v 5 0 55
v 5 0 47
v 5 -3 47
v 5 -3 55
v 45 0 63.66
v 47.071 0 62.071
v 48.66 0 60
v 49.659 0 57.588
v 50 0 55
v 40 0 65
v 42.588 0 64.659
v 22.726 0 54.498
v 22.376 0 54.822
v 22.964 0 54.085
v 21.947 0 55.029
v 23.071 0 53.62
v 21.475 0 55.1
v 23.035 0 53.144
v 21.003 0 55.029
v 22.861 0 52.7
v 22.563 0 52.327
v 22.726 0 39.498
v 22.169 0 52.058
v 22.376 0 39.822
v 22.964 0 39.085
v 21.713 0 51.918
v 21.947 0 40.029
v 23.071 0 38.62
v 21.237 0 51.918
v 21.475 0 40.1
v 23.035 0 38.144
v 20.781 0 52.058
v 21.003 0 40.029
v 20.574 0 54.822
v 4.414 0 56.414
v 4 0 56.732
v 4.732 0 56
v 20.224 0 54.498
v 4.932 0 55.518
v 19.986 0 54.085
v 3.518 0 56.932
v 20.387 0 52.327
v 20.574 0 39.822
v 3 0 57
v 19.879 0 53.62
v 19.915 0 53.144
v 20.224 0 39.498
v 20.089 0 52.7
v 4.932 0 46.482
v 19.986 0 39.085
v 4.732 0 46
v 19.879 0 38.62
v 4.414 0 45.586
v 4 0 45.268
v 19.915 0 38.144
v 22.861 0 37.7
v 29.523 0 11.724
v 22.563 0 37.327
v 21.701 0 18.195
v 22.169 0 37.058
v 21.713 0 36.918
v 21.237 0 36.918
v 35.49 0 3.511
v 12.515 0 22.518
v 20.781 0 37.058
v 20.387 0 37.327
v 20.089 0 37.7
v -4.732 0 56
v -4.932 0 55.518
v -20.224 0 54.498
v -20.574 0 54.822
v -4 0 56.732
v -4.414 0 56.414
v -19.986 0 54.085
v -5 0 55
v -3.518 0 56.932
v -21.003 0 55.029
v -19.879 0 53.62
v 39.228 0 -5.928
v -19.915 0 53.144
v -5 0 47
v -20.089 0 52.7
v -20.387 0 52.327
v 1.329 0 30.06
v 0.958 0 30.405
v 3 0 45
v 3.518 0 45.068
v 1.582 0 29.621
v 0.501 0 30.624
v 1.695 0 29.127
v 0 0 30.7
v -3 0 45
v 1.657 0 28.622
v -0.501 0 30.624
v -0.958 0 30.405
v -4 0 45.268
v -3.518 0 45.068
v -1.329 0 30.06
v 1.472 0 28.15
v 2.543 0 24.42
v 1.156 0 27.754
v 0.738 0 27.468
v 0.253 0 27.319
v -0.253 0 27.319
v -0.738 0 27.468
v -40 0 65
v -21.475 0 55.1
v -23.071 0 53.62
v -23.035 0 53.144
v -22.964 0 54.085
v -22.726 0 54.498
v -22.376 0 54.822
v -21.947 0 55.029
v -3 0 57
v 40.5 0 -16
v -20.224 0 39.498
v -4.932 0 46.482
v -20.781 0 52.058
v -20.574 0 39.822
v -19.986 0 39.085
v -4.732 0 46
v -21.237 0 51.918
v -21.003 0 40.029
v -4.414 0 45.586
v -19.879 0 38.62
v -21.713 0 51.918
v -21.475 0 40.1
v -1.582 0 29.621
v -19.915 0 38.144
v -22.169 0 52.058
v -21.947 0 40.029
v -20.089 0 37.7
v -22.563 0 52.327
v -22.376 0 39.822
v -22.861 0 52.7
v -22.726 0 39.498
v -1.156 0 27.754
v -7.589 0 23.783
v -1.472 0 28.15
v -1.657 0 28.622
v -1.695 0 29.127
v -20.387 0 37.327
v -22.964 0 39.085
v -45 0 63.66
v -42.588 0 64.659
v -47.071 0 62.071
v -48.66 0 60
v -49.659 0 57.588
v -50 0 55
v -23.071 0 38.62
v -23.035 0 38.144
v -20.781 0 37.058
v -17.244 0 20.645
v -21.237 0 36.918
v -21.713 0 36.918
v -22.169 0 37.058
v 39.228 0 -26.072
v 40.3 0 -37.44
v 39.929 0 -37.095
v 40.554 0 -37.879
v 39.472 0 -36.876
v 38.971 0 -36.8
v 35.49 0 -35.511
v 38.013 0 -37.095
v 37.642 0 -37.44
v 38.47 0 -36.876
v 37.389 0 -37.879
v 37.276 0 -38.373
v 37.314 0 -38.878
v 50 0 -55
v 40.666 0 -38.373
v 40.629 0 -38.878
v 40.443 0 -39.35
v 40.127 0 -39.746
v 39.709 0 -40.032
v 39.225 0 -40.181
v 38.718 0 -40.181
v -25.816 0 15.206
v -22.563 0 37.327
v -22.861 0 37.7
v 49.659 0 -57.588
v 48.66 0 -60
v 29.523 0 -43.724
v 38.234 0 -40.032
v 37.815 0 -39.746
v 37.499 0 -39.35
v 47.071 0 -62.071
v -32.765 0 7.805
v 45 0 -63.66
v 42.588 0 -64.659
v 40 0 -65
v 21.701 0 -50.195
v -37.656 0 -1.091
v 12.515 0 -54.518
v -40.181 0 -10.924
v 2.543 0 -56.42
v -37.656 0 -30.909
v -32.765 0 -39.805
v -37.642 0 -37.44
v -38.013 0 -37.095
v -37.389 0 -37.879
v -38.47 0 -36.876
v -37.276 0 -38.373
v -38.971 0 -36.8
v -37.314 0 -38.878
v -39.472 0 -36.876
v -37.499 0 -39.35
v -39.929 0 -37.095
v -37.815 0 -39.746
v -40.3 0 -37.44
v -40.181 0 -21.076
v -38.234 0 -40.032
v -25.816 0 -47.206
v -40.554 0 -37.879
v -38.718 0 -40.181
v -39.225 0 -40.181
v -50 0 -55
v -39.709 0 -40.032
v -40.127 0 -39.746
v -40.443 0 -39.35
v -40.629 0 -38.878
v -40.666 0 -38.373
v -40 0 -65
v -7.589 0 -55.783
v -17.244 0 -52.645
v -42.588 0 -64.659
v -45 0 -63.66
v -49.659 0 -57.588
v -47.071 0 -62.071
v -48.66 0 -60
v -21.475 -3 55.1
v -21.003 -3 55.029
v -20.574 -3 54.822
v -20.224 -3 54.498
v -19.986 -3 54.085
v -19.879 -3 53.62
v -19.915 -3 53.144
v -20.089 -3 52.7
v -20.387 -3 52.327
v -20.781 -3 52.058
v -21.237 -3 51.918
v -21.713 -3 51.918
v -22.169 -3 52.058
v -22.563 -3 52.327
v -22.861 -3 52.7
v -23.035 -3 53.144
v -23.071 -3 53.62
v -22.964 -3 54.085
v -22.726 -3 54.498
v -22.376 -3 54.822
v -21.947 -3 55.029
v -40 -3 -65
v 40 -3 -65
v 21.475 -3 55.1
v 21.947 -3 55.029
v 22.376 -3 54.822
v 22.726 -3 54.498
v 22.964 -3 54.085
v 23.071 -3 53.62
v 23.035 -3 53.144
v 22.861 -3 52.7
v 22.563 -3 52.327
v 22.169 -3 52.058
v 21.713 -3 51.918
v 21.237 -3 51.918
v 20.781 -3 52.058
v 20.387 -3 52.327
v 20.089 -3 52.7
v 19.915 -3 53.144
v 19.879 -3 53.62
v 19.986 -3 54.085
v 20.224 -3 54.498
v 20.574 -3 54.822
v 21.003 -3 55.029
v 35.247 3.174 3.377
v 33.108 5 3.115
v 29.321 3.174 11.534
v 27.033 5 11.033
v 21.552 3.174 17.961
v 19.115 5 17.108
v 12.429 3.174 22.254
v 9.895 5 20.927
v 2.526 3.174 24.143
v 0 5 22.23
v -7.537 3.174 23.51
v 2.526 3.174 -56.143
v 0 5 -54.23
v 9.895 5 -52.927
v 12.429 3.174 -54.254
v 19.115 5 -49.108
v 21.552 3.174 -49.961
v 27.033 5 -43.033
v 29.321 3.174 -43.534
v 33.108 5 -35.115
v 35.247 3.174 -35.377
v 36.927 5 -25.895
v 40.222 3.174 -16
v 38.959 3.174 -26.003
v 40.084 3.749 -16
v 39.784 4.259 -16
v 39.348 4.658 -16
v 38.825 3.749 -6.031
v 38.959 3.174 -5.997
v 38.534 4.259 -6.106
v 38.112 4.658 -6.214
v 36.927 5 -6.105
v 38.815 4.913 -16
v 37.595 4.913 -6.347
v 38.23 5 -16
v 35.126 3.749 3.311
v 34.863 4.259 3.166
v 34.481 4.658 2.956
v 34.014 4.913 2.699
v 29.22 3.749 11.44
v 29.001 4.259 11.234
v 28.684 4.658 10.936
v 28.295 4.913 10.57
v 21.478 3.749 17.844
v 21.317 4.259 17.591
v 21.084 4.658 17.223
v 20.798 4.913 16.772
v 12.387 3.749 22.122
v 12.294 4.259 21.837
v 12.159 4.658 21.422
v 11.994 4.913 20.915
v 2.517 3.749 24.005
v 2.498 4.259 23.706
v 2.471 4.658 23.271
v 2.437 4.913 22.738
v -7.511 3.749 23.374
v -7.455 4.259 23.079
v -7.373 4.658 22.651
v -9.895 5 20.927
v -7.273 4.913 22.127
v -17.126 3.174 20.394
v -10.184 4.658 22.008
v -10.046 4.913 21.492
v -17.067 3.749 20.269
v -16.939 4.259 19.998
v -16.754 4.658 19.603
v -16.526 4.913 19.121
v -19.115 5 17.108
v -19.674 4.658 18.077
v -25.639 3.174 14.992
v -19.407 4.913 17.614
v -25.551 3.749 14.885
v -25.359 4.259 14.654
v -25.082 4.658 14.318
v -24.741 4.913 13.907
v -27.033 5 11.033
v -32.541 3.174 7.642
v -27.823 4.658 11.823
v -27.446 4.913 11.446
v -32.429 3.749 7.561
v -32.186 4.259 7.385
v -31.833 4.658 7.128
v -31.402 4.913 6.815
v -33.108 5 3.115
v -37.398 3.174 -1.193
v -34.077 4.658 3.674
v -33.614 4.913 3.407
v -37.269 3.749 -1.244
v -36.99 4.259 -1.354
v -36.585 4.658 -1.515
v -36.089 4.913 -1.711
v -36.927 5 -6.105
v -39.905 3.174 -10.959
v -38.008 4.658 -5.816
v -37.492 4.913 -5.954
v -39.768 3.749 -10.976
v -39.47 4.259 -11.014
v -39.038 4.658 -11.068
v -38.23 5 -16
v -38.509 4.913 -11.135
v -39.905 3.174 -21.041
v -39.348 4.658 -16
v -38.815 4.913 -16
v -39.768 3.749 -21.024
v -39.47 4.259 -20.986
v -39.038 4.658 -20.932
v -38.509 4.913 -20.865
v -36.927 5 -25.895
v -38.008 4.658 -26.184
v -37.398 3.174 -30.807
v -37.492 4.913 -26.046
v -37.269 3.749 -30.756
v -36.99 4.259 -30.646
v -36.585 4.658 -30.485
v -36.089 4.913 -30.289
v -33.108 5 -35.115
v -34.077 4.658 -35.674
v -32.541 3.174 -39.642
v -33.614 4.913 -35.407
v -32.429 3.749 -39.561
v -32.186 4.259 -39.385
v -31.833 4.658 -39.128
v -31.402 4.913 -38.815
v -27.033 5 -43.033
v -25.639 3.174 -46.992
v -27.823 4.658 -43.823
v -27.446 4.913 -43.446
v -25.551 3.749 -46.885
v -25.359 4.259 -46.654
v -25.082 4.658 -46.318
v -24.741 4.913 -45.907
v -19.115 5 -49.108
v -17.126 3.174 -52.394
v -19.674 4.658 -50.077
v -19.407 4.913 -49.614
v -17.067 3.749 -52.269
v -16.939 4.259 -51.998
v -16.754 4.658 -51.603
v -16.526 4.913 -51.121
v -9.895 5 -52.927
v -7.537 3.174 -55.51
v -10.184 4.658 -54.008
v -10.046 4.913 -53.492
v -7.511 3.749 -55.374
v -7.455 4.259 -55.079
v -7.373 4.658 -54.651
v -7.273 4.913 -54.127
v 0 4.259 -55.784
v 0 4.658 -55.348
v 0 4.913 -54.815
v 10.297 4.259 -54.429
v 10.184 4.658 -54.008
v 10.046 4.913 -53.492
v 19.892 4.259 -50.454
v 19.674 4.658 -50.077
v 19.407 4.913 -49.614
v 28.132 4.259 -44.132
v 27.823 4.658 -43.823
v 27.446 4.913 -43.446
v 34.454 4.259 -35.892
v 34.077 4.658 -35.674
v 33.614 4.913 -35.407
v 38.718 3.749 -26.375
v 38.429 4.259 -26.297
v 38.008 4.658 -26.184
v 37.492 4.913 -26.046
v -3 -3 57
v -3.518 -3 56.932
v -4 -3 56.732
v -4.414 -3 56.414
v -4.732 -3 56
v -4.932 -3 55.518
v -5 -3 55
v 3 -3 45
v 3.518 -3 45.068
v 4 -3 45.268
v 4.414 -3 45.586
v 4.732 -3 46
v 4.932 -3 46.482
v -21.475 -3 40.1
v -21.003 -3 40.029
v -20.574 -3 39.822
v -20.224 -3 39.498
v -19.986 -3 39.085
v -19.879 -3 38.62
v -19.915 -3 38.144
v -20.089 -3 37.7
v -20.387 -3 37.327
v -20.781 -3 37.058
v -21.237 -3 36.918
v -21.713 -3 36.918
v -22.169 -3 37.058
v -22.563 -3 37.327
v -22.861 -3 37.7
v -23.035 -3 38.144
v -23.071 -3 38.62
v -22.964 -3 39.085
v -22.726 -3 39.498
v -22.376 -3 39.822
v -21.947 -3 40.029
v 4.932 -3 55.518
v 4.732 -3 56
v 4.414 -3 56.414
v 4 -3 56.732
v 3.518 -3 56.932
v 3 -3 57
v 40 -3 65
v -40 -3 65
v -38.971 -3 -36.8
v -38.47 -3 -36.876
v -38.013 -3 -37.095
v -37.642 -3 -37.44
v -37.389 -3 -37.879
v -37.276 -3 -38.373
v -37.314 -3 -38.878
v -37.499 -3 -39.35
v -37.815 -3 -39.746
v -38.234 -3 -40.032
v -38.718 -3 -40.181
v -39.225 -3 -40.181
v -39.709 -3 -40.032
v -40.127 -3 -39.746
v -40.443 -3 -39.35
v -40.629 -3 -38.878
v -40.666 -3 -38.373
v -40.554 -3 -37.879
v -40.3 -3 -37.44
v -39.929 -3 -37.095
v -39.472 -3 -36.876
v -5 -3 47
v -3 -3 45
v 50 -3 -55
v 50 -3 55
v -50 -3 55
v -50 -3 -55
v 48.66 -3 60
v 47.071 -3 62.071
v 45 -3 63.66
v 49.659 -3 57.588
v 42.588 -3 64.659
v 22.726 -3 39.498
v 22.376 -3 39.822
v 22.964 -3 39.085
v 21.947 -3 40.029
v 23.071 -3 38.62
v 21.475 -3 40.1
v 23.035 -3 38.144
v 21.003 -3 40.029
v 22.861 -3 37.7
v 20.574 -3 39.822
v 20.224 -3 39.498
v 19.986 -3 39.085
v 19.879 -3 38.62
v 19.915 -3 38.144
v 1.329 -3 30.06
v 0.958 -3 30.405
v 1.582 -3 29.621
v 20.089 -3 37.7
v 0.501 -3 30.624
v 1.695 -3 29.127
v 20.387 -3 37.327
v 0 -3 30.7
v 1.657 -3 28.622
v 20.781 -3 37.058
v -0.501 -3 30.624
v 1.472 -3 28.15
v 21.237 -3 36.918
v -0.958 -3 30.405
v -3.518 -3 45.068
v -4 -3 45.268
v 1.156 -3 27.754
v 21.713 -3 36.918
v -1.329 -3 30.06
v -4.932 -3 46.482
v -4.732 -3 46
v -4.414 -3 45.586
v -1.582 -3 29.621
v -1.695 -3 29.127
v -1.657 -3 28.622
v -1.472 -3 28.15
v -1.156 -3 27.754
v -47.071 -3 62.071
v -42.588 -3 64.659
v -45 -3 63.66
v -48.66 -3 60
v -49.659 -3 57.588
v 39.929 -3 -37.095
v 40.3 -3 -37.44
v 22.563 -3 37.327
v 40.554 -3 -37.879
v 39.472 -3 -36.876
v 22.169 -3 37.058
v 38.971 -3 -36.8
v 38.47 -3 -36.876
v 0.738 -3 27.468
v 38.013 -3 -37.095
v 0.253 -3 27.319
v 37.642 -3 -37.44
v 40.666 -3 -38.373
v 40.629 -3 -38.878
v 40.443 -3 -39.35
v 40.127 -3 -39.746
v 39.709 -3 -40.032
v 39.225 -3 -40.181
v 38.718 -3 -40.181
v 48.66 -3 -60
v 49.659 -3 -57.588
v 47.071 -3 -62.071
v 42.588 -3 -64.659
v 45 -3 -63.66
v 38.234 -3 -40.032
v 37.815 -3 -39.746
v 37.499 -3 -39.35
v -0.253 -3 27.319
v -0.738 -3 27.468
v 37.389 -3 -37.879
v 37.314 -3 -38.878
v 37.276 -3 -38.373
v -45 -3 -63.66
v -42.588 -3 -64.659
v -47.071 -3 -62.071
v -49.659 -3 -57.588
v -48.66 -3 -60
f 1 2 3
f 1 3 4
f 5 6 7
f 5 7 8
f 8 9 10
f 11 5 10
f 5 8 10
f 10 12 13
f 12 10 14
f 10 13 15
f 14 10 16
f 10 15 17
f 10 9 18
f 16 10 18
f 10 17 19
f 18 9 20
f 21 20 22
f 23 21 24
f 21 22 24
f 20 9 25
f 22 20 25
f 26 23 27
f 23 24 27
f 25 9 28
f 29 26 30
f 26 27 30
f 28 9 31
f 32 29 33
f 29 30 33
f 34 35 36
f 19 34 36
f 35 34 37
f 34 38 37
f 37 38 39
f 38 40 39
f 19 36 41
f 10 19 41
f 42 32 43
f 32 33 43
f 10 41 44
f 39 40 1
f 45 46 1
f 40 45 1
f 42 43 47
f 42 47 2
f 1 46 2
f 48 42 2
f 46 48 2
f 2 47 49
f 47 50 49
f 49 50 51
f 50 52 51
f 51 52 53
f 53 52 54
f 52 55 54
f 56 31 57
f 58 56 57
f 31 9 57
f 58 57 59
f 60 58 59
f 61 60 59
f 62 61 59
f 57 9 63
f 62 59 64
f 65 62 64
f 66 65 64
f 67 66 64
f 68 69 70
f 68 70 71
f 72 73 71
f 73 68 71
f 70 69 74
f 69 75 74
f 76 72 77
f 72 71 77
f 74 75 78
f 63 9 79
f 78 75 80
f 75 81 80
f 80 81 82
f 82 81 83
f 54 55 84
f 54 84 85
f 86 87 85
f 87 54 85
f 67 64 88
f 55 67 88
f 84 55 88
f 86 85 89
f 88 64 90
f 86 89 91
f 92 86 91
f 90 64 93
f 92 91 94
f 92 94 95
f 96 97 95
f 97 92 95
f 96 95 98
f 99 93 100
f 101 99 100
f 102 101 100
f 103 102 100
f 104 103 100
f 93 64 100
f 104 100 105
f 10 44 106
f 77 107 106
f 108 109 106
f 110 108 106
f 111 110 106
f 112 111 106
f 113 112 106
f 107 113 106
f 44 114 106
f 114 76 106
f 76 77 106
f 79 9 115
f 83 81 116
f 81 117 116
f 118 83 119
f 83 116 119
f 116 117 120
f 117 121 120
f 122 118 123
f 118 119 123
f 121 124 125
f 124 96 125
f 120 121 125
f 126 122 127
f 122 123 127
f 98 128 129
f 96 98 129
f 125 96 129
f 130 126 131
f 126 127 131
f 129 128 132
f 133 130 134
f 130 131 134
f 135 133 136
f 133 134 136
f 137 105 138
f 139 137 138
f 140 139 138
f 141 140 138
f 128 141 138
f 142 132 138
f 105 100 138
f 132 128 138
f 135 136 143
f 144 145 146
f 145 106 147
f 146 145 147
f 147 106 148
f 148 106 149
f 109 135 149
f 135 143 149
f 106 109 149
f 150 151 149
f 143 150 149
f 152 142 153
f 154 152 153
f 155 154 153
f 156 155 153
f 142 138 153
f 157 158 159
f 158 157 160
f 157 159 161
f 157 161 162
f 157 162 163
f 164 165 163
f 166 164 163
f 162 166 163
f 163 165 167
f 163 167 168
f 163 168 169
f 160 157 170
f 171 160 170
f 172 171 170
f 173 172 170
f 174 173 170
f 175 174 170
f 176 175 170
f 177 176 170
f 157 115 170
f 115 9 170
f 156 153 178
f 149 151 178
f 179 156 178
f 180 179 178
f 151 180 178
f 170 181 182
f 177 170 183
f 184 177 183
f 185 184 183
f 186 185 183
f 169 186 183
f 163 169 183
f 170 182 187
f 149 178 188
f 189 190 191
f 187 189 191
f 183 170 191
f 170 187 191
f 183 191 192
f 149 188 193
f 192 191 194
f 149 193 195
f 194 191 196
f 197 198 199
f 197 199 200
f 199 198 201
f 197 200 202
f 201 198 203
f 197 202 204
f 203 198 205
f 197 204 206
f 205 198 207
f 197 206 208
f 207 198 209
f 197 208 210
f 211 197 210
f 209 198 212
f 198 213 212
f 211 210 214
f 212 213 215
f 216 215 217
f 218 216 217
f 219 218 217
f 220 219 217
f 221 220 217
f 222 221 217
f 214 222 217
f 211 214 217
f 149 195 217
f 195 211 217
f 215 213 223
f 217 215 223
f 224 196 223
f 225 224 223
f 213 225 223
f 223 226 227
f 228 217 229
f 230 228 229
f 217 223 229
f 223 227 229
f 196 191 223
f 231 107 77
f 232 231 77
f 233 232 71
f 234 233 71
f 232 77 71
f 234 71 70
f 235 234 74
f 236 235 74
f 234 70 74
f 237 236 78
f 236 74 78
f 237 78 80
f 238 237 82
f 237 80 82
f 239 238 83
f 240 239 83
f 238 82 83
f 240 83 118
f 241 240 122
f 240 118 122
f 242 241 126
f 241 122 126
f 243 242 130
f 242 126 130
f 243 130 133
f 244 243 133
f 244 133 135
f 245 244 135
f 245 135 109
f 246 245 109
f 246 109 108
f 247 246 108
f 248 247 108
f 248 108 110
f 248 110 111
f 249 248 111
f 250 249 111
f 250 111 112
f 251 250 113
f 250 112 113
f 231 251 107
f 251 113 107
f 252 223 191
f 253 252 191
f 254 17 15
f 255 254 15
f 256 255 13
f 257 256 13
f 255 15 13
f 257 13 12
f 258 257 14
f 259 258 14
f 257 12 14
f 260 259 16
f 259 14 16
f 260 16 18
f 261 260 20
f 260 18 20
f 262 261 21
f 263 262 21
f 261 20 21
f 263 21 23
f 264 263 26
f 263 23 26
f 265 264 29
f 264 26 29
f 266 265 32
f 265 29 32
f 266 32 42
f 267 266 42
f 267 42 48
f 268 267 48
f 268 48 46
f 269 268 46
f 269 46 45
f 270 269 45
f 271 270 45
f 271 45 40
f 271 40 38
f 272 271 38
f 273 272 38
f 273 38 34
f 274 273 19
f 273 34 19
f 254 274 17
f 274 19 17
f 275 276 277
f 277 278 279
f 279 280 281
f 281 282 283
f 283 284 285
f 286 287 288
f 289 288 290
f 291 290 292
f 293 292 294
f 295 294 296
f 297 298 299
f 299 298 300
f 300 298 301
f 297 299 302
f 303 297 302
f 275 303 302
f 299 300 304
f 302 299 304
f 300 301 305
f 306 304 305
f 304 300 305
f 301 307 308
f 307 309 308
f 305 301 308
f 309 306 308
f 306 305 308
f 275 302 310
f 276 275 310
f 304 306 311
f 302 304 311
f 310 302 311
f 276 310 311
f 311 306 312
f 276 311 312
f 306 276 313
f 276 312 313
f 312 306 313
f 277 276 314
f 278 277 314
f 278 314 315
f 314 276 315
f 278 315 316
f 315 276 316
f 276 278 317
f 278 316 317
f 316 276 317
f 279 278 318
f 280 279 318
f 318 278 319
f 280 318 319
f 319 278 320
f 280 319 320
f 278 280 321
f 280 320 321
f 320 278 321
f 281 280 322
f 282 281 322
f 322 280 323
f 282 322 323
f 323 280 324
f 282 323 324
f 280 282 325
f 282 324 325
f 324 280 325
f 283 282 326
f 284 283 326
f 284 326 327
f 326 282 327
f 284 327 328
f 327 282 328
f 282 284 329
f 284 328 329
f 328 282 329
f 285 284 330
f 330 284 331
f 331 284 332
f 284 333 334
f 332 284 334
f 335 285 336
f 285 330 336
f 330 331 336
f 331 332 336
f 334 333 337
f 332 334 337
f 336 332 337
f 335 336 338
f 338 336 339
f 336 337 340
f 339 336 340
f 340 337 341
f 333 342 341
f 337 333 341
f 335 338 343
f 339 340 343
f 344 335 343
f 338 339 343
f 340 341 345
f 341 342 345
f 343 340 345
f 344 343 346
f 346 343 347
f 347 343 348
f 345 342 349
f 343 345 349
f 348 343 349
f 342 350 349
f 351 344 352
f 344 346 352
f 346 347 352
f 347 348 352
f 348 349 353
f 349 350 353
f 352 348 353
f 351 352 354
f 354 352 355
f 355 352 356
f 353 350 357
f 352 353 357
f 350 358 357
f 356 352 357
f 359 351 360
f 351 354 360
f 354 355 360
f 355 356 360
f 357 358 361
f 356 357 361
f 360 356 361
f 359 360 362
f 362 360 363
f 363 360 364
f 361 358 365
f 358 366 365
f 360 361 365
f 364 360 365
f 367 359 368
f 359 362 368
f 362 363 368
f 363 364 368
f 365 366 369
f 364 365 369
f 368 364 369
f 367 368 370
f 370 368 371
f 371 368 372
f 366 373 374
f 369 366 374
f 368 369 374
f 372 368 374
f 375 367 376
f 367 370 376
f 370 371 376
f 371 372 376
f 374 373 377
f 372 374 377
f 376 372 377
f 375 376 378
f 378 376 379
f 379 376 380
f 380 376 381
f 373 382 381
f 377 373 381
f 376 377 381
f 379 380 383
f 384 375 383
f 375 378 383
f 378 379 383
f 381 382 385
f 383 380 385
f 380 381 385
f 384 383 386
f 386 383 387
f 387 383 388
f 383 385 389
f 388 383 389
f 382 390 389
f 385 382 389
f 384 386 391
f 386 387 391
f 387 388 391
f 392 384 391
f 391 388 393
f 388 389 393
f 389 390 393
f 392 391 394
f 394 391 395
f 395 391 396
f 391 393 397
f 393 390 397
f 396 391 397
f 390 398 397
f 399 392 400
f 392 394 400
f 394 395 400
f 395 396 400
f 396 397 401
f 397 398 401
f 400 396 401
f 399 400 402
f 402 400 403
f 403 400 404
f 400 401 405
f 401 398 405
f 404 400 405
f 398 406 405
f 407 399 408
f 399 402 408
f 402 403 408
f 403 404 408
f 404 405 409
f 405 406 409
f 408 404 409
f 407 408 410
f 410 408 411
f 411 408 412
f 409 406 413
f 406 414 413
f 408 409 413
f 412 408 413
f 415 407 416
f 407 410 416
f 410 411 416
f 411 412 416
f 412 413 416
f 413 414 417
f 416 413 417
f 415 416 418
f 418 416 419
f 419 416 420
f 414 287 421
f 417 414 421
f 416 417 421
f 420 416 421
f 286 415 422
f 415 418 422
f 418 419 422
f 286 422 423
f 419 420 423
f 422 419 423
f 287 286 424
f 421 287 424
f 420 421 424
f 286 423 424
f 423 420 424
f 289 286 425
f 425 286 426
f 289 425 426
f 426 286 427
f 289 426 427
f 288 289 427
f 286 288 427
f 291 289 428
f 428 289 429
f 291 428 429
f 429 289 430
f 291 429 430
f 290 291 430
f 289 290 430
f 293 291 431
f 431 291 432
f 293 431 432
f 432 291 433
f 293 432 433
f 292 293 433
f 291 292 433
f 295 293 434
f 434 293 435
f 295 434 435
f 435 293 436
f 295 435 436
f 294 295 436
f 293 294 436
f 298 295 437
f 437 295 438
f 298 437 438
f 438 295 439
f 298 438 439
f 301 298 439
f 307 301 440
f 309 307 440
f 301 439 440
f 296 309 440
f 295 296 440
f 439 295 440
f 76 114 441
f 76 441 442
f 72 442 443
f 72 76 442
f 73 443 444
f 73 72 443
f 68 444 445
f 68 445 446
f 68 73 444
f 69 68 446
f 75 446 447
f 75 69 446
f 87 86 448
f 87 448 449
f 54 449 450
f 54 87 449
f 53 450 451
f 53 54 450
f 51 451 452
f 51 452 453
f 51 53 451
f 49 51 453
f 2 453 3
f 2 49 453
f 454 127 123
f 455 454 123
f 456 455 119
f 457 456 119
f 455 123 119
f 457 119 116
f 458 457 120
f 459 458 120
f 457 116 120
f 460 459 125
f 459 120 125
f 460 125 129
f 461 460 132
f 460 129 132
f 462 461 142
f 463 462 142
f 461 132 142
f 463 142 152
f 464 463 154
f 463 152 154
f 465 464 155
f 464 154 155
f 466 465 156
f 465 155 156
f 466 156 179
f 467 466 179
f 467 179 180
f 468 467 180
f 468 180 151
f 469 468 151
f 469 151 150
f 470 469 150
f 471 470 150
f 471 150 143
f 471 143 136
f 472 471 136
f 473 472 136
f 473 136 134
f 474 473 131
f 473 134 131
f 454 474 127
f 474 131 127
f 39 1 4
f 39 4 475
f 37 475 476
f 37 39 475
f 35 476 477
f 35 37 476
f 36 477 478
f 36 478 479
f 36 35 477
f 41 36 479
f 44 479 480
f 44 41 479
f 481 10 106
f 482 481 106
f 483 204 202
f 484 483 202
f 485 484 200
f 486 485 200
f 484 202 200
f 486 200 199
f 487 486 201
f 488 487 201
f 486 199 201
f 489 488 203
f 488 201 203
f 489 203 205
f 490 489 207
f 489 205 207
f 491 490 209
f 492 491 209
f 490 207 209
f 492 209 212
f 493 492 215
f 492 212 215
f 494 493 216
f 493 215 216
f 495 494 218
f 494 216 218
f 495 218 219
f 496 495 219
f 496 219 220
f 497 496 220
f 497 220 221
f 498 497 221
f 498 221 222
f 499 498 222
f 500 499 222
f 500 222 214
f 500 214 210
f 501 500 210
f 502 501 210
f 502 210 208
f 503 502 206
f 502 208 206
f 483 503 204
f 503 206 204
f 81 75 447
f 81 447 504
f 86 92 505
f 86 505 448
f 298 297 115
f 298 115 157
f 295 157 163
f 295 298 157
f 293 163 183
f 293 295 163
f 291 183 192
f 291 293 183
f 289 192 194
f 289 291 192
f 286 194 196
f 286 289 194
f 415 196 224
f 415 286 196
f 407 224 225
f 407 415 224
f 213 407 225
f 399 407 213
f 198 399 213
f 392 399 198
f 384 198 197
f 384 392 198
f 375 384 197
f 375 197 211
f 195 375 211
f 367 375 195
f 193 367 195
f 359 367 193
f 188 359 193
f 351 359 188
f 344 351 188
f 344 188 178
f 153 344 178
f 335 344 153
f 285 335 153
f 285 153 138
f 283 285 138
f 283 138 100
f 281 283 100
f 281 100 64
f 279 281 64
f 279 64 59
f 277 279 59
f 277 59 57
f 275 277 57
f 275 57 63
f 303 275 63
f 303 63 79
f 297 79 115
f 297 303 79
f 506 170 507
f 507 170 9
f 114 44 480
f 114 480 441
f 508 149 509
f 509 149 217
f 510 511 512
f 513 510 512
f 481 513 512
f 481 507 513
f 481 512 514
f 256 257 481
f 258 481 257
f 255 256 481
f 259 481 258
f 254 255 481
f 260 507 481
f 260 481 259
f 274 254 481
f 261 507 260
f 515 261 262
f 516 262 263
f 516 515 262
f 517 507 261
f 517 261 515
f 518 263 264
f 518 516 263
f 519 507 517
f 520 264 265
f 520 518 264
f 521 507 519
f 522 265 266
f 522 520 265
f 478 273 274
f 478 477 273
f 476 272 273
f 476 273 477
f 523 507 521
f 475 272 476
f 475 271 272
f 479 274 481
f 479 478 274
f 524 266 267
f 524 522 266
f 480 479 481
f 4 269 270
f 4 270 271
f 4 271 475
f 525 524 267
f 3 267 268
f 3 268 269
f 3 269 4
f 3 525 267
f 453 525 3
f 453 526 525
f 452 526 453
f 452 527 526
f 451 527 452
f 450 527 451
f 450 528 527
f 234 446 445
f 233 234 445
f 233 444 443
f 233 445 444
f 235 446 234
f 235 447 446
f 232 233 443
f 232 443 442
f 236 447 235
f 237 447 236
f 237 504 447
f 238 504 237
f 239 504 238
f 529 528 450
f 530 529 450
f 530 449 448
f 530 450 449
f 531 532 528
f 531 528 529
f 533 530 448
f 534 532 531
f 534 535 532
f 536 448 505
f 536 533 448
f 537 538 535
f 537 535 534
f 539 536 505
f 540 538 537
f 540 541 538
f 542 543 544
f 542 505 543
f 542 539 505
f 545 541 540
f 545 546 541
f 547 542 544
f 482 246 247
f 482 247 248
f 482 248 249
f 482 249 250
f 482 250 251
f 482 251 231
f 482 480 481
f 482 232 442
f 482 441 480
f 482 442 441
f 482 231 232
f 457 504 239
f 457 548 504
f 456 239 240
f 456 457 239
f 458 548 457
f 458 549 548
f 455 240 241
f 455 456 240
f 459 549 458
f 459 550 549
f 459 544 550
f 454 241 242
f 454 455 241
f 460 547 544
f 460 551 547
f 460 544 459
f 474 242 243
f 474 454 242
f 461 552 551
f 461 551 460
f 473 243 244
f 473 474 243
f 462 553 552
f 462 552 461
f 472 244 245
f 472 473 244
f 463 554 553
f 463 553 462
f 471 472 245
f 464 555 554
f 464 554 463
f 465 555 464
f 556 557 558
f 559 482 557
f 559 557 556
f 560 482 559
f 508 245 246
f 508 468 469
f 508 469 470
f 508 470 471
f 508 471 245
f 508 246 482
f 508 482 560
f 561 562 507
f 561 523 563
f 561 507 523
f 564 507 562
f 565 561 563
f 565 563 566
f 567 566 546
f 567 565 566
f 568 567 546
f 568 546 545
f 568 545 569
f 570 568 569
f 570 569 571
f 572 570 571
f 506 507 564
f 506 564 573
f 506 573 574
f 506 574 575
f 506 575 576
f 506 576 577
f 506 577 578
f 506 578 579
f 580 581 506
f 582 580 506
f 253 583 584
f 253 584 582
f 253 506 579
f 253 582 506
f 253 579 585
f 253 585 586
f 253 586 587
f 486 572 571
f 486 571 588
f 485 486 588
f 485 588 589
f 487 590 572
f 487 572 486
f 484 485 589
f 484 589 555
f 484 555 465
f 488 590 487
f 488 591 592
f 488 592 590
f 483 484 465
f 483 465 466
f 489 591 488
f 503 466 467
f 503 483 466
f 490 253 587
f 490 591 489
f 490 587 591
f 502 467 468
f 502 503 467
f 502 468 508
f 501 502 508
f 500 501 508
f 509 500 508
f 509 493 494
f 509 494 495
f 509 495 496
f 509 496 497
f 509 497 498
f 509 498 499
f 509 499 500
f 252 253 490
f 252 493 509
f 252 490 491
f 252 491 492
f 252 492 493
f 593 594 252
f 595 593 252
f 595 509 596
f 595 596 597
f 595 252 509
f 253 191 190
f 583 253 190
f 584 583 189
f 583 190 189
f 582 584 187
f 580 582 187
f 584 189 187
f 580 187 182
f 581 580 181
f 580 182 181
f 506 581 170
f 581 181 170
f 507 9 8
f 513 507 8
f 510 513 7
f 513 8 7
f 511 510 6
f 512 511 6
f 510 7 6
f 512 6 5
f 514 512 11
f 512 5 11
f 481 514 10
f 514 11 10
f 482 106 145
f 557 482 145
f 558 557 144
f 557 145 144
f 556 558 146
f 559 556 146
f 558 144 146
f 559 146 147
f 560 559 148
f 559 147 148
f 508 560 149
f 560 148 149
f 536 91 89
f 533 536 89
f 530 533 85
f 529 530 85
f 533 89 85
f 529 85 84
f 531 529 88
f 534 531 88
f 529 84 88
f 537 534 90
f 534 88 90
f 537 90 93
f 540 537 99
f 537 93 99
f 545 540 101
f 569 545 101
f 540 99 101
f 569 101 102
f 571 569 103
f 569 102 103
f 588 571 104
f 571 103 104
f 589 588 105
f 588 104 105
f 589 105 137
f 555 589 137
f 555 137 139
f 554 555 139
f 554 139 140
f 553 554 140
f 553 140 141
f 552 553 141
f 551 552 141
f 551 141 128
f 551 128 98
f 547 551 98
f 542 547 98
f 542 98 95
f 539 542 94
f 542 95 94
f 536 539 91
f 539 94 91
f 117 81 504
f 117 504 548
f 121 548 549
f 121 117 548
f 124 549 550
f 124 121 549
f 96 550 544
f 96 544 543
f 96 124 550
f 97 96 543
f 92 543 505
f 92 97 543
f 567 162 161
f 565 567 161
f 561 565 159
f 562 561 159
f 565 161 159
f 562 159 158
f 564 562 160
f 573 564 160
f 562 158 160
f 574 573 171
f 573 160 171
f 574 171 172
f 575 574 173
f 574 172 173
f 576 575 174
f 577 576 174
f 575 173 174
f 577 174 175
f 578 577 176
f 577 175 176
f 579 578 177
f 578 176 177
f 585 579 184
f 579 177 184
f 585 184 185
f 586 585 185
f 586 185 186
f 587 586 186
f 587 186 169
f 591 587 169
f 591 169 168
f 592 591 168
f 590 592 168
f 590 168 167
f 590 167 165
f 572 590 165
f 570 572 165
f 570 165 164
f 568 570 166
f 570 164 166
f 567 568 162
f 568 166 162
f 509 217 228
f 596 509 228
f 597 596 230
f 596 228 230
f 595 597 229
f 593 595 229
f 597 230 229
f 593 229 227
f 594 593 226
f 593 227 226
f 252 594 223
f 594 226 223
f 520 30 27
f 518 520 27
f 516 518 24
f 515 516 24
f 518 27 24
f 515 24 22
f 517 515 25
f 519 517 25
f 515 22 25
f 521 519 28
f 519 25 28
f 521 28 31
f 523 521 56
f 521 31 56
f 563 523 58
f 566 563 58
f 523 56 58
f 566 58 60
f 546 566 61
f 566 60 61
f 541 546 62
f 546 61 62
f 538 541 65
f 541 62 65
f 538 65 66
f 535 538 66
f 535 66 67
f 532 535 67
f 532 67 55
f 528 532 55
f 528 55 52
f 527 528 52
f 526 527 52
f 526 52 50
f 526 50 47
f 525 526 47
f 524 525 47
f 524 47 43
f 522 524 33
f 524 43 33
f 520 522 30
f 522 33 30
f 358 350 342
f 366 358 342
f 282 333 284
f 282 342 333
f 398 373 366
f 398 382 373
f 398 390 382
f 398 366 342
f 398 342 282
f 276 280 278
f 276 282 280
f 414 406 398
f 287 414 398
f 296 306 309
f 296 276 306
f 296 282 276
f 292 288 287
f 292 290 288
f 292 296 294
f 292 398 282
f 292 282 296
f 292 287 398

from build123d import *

# Parameters (mm, degrees)
SKETCH1_R           = 1.6
SKETCH1_R_2         = 1.7
BOSS_EXTRUDE1_DEPTH = 3
SKETCH2_R           = 40.5
BOSS_EXTRUDE2_DEPTH = 5
BOSS_EXTRUDE2_TAPER = 5
FILLET1_R           = 2


with BuildPart() as part:
    # Sketch1 → Boss-Extrude1 (new body)
    with BuildSketch(Plane(origin=(0, 0, 0), x_dir=(1, 0, 0), z_dir=(0, 1, 0))):
        with BuildLine():
            Line((40, -65), (-40, -65))
            ThreePointArc((-40, -65), (-47.071067812, -62.071067812), (-50, -55))
            Line((-50, -55), (-50, 55))
            ThreePointArc((-50, 55), (-47.071067812, 62.071067812), (-40, 65))
            Line((-40, 65), (40, 65))
            ThreePointArc((40, 65), (47.071067812, 62.071067812), (50, 55))
            Line((50, 55), (50, -55))
            ThreePointArc((50, -55), (47.071067812, -62.071067812), (40, -65))
        make_face()
        with Locations(Location((21.475, -38.5, 0), (0, 0, 270))):
            Circle(SKETCH1_R, mode=Mode.SUBTRACT)
        with Locations(Location((21.475, -53.5, 0), (0, 0, 270))):
            Circle(SKETCH1_R, mode=Mode.SUBTRACT)
        with Locations(Location((-21.475, -38.5, 0), (0, 0, 270))):
            Circle(SKETCH1_R, mode=Mode.SUBTRACT)
        with Locations(Location((-21.475, -53.5, 0), (0, 0, 270))):
            Circle(SKETCH1_R, mode=Mode.SUBTRACT)
        with Locations(Location((0, -29, 0), (0, 0, 270))):
            Circle(SKETCH1_R_2, mode=Mode.SUBTRACT)
        with Locations(Location((-38.97114317, 38.5, 0), (0, 0, 270))):
            Circle(SKETCH1_R_2, mode=Mode.SUBTRACT)
        with Locations(Location((38.97114317, 38.5, 0), (0, 0, 270))):
            Circle(SKETCH1_R_2, mode=Mode.SUBTRACT)
        with BuildLine():
            Line((3, -57), (-3, -57))
            ThreePointArc((-3, -57), (-4.414213562, -56.414213562), (-5, -55))
            Line((-5, -55), (-5, -47))
            ThreePointArc((-5, -47), (-4.414213562, -45.585786438), (-3, -45))
            Line((-3, -45), (3, -45))
            ThreePointArc((3, -45), (4.414213562, -45.585786438), (5, -47))
            Line((5, -47), (5, -55))
            ThreePointArc((5, -55), (4.414213562, -56.414213562), (3, -57))
        make_face(mode=Mode.SUBTRACT)
    extrude(amount=-BOSS_EXTRUDE1_DEPTH)

    # Sketch2 → Boss-Extrude2 (add)
    with BuildSketch(Plane(origin=(0, 0, 0), x_dir=(1, 0, 0), z_dir=(0, 1, 0))):
        with Locations((0, 16)):
            Circle(SKETCH2_R)
    extrude(amount=BOSS_EXTRUDE2_DEPTH, taper=BOSS_EXTRUDE2_TAPER)

    # Fillet1
    fillet1_edges = [part.edges().sort_by_distance(p)[0] for p in [
        (-40.062556682, 5, -16),
    ]]
    fillet(fillet1_edges, radius=FILLET1_R)


solid = part.part
